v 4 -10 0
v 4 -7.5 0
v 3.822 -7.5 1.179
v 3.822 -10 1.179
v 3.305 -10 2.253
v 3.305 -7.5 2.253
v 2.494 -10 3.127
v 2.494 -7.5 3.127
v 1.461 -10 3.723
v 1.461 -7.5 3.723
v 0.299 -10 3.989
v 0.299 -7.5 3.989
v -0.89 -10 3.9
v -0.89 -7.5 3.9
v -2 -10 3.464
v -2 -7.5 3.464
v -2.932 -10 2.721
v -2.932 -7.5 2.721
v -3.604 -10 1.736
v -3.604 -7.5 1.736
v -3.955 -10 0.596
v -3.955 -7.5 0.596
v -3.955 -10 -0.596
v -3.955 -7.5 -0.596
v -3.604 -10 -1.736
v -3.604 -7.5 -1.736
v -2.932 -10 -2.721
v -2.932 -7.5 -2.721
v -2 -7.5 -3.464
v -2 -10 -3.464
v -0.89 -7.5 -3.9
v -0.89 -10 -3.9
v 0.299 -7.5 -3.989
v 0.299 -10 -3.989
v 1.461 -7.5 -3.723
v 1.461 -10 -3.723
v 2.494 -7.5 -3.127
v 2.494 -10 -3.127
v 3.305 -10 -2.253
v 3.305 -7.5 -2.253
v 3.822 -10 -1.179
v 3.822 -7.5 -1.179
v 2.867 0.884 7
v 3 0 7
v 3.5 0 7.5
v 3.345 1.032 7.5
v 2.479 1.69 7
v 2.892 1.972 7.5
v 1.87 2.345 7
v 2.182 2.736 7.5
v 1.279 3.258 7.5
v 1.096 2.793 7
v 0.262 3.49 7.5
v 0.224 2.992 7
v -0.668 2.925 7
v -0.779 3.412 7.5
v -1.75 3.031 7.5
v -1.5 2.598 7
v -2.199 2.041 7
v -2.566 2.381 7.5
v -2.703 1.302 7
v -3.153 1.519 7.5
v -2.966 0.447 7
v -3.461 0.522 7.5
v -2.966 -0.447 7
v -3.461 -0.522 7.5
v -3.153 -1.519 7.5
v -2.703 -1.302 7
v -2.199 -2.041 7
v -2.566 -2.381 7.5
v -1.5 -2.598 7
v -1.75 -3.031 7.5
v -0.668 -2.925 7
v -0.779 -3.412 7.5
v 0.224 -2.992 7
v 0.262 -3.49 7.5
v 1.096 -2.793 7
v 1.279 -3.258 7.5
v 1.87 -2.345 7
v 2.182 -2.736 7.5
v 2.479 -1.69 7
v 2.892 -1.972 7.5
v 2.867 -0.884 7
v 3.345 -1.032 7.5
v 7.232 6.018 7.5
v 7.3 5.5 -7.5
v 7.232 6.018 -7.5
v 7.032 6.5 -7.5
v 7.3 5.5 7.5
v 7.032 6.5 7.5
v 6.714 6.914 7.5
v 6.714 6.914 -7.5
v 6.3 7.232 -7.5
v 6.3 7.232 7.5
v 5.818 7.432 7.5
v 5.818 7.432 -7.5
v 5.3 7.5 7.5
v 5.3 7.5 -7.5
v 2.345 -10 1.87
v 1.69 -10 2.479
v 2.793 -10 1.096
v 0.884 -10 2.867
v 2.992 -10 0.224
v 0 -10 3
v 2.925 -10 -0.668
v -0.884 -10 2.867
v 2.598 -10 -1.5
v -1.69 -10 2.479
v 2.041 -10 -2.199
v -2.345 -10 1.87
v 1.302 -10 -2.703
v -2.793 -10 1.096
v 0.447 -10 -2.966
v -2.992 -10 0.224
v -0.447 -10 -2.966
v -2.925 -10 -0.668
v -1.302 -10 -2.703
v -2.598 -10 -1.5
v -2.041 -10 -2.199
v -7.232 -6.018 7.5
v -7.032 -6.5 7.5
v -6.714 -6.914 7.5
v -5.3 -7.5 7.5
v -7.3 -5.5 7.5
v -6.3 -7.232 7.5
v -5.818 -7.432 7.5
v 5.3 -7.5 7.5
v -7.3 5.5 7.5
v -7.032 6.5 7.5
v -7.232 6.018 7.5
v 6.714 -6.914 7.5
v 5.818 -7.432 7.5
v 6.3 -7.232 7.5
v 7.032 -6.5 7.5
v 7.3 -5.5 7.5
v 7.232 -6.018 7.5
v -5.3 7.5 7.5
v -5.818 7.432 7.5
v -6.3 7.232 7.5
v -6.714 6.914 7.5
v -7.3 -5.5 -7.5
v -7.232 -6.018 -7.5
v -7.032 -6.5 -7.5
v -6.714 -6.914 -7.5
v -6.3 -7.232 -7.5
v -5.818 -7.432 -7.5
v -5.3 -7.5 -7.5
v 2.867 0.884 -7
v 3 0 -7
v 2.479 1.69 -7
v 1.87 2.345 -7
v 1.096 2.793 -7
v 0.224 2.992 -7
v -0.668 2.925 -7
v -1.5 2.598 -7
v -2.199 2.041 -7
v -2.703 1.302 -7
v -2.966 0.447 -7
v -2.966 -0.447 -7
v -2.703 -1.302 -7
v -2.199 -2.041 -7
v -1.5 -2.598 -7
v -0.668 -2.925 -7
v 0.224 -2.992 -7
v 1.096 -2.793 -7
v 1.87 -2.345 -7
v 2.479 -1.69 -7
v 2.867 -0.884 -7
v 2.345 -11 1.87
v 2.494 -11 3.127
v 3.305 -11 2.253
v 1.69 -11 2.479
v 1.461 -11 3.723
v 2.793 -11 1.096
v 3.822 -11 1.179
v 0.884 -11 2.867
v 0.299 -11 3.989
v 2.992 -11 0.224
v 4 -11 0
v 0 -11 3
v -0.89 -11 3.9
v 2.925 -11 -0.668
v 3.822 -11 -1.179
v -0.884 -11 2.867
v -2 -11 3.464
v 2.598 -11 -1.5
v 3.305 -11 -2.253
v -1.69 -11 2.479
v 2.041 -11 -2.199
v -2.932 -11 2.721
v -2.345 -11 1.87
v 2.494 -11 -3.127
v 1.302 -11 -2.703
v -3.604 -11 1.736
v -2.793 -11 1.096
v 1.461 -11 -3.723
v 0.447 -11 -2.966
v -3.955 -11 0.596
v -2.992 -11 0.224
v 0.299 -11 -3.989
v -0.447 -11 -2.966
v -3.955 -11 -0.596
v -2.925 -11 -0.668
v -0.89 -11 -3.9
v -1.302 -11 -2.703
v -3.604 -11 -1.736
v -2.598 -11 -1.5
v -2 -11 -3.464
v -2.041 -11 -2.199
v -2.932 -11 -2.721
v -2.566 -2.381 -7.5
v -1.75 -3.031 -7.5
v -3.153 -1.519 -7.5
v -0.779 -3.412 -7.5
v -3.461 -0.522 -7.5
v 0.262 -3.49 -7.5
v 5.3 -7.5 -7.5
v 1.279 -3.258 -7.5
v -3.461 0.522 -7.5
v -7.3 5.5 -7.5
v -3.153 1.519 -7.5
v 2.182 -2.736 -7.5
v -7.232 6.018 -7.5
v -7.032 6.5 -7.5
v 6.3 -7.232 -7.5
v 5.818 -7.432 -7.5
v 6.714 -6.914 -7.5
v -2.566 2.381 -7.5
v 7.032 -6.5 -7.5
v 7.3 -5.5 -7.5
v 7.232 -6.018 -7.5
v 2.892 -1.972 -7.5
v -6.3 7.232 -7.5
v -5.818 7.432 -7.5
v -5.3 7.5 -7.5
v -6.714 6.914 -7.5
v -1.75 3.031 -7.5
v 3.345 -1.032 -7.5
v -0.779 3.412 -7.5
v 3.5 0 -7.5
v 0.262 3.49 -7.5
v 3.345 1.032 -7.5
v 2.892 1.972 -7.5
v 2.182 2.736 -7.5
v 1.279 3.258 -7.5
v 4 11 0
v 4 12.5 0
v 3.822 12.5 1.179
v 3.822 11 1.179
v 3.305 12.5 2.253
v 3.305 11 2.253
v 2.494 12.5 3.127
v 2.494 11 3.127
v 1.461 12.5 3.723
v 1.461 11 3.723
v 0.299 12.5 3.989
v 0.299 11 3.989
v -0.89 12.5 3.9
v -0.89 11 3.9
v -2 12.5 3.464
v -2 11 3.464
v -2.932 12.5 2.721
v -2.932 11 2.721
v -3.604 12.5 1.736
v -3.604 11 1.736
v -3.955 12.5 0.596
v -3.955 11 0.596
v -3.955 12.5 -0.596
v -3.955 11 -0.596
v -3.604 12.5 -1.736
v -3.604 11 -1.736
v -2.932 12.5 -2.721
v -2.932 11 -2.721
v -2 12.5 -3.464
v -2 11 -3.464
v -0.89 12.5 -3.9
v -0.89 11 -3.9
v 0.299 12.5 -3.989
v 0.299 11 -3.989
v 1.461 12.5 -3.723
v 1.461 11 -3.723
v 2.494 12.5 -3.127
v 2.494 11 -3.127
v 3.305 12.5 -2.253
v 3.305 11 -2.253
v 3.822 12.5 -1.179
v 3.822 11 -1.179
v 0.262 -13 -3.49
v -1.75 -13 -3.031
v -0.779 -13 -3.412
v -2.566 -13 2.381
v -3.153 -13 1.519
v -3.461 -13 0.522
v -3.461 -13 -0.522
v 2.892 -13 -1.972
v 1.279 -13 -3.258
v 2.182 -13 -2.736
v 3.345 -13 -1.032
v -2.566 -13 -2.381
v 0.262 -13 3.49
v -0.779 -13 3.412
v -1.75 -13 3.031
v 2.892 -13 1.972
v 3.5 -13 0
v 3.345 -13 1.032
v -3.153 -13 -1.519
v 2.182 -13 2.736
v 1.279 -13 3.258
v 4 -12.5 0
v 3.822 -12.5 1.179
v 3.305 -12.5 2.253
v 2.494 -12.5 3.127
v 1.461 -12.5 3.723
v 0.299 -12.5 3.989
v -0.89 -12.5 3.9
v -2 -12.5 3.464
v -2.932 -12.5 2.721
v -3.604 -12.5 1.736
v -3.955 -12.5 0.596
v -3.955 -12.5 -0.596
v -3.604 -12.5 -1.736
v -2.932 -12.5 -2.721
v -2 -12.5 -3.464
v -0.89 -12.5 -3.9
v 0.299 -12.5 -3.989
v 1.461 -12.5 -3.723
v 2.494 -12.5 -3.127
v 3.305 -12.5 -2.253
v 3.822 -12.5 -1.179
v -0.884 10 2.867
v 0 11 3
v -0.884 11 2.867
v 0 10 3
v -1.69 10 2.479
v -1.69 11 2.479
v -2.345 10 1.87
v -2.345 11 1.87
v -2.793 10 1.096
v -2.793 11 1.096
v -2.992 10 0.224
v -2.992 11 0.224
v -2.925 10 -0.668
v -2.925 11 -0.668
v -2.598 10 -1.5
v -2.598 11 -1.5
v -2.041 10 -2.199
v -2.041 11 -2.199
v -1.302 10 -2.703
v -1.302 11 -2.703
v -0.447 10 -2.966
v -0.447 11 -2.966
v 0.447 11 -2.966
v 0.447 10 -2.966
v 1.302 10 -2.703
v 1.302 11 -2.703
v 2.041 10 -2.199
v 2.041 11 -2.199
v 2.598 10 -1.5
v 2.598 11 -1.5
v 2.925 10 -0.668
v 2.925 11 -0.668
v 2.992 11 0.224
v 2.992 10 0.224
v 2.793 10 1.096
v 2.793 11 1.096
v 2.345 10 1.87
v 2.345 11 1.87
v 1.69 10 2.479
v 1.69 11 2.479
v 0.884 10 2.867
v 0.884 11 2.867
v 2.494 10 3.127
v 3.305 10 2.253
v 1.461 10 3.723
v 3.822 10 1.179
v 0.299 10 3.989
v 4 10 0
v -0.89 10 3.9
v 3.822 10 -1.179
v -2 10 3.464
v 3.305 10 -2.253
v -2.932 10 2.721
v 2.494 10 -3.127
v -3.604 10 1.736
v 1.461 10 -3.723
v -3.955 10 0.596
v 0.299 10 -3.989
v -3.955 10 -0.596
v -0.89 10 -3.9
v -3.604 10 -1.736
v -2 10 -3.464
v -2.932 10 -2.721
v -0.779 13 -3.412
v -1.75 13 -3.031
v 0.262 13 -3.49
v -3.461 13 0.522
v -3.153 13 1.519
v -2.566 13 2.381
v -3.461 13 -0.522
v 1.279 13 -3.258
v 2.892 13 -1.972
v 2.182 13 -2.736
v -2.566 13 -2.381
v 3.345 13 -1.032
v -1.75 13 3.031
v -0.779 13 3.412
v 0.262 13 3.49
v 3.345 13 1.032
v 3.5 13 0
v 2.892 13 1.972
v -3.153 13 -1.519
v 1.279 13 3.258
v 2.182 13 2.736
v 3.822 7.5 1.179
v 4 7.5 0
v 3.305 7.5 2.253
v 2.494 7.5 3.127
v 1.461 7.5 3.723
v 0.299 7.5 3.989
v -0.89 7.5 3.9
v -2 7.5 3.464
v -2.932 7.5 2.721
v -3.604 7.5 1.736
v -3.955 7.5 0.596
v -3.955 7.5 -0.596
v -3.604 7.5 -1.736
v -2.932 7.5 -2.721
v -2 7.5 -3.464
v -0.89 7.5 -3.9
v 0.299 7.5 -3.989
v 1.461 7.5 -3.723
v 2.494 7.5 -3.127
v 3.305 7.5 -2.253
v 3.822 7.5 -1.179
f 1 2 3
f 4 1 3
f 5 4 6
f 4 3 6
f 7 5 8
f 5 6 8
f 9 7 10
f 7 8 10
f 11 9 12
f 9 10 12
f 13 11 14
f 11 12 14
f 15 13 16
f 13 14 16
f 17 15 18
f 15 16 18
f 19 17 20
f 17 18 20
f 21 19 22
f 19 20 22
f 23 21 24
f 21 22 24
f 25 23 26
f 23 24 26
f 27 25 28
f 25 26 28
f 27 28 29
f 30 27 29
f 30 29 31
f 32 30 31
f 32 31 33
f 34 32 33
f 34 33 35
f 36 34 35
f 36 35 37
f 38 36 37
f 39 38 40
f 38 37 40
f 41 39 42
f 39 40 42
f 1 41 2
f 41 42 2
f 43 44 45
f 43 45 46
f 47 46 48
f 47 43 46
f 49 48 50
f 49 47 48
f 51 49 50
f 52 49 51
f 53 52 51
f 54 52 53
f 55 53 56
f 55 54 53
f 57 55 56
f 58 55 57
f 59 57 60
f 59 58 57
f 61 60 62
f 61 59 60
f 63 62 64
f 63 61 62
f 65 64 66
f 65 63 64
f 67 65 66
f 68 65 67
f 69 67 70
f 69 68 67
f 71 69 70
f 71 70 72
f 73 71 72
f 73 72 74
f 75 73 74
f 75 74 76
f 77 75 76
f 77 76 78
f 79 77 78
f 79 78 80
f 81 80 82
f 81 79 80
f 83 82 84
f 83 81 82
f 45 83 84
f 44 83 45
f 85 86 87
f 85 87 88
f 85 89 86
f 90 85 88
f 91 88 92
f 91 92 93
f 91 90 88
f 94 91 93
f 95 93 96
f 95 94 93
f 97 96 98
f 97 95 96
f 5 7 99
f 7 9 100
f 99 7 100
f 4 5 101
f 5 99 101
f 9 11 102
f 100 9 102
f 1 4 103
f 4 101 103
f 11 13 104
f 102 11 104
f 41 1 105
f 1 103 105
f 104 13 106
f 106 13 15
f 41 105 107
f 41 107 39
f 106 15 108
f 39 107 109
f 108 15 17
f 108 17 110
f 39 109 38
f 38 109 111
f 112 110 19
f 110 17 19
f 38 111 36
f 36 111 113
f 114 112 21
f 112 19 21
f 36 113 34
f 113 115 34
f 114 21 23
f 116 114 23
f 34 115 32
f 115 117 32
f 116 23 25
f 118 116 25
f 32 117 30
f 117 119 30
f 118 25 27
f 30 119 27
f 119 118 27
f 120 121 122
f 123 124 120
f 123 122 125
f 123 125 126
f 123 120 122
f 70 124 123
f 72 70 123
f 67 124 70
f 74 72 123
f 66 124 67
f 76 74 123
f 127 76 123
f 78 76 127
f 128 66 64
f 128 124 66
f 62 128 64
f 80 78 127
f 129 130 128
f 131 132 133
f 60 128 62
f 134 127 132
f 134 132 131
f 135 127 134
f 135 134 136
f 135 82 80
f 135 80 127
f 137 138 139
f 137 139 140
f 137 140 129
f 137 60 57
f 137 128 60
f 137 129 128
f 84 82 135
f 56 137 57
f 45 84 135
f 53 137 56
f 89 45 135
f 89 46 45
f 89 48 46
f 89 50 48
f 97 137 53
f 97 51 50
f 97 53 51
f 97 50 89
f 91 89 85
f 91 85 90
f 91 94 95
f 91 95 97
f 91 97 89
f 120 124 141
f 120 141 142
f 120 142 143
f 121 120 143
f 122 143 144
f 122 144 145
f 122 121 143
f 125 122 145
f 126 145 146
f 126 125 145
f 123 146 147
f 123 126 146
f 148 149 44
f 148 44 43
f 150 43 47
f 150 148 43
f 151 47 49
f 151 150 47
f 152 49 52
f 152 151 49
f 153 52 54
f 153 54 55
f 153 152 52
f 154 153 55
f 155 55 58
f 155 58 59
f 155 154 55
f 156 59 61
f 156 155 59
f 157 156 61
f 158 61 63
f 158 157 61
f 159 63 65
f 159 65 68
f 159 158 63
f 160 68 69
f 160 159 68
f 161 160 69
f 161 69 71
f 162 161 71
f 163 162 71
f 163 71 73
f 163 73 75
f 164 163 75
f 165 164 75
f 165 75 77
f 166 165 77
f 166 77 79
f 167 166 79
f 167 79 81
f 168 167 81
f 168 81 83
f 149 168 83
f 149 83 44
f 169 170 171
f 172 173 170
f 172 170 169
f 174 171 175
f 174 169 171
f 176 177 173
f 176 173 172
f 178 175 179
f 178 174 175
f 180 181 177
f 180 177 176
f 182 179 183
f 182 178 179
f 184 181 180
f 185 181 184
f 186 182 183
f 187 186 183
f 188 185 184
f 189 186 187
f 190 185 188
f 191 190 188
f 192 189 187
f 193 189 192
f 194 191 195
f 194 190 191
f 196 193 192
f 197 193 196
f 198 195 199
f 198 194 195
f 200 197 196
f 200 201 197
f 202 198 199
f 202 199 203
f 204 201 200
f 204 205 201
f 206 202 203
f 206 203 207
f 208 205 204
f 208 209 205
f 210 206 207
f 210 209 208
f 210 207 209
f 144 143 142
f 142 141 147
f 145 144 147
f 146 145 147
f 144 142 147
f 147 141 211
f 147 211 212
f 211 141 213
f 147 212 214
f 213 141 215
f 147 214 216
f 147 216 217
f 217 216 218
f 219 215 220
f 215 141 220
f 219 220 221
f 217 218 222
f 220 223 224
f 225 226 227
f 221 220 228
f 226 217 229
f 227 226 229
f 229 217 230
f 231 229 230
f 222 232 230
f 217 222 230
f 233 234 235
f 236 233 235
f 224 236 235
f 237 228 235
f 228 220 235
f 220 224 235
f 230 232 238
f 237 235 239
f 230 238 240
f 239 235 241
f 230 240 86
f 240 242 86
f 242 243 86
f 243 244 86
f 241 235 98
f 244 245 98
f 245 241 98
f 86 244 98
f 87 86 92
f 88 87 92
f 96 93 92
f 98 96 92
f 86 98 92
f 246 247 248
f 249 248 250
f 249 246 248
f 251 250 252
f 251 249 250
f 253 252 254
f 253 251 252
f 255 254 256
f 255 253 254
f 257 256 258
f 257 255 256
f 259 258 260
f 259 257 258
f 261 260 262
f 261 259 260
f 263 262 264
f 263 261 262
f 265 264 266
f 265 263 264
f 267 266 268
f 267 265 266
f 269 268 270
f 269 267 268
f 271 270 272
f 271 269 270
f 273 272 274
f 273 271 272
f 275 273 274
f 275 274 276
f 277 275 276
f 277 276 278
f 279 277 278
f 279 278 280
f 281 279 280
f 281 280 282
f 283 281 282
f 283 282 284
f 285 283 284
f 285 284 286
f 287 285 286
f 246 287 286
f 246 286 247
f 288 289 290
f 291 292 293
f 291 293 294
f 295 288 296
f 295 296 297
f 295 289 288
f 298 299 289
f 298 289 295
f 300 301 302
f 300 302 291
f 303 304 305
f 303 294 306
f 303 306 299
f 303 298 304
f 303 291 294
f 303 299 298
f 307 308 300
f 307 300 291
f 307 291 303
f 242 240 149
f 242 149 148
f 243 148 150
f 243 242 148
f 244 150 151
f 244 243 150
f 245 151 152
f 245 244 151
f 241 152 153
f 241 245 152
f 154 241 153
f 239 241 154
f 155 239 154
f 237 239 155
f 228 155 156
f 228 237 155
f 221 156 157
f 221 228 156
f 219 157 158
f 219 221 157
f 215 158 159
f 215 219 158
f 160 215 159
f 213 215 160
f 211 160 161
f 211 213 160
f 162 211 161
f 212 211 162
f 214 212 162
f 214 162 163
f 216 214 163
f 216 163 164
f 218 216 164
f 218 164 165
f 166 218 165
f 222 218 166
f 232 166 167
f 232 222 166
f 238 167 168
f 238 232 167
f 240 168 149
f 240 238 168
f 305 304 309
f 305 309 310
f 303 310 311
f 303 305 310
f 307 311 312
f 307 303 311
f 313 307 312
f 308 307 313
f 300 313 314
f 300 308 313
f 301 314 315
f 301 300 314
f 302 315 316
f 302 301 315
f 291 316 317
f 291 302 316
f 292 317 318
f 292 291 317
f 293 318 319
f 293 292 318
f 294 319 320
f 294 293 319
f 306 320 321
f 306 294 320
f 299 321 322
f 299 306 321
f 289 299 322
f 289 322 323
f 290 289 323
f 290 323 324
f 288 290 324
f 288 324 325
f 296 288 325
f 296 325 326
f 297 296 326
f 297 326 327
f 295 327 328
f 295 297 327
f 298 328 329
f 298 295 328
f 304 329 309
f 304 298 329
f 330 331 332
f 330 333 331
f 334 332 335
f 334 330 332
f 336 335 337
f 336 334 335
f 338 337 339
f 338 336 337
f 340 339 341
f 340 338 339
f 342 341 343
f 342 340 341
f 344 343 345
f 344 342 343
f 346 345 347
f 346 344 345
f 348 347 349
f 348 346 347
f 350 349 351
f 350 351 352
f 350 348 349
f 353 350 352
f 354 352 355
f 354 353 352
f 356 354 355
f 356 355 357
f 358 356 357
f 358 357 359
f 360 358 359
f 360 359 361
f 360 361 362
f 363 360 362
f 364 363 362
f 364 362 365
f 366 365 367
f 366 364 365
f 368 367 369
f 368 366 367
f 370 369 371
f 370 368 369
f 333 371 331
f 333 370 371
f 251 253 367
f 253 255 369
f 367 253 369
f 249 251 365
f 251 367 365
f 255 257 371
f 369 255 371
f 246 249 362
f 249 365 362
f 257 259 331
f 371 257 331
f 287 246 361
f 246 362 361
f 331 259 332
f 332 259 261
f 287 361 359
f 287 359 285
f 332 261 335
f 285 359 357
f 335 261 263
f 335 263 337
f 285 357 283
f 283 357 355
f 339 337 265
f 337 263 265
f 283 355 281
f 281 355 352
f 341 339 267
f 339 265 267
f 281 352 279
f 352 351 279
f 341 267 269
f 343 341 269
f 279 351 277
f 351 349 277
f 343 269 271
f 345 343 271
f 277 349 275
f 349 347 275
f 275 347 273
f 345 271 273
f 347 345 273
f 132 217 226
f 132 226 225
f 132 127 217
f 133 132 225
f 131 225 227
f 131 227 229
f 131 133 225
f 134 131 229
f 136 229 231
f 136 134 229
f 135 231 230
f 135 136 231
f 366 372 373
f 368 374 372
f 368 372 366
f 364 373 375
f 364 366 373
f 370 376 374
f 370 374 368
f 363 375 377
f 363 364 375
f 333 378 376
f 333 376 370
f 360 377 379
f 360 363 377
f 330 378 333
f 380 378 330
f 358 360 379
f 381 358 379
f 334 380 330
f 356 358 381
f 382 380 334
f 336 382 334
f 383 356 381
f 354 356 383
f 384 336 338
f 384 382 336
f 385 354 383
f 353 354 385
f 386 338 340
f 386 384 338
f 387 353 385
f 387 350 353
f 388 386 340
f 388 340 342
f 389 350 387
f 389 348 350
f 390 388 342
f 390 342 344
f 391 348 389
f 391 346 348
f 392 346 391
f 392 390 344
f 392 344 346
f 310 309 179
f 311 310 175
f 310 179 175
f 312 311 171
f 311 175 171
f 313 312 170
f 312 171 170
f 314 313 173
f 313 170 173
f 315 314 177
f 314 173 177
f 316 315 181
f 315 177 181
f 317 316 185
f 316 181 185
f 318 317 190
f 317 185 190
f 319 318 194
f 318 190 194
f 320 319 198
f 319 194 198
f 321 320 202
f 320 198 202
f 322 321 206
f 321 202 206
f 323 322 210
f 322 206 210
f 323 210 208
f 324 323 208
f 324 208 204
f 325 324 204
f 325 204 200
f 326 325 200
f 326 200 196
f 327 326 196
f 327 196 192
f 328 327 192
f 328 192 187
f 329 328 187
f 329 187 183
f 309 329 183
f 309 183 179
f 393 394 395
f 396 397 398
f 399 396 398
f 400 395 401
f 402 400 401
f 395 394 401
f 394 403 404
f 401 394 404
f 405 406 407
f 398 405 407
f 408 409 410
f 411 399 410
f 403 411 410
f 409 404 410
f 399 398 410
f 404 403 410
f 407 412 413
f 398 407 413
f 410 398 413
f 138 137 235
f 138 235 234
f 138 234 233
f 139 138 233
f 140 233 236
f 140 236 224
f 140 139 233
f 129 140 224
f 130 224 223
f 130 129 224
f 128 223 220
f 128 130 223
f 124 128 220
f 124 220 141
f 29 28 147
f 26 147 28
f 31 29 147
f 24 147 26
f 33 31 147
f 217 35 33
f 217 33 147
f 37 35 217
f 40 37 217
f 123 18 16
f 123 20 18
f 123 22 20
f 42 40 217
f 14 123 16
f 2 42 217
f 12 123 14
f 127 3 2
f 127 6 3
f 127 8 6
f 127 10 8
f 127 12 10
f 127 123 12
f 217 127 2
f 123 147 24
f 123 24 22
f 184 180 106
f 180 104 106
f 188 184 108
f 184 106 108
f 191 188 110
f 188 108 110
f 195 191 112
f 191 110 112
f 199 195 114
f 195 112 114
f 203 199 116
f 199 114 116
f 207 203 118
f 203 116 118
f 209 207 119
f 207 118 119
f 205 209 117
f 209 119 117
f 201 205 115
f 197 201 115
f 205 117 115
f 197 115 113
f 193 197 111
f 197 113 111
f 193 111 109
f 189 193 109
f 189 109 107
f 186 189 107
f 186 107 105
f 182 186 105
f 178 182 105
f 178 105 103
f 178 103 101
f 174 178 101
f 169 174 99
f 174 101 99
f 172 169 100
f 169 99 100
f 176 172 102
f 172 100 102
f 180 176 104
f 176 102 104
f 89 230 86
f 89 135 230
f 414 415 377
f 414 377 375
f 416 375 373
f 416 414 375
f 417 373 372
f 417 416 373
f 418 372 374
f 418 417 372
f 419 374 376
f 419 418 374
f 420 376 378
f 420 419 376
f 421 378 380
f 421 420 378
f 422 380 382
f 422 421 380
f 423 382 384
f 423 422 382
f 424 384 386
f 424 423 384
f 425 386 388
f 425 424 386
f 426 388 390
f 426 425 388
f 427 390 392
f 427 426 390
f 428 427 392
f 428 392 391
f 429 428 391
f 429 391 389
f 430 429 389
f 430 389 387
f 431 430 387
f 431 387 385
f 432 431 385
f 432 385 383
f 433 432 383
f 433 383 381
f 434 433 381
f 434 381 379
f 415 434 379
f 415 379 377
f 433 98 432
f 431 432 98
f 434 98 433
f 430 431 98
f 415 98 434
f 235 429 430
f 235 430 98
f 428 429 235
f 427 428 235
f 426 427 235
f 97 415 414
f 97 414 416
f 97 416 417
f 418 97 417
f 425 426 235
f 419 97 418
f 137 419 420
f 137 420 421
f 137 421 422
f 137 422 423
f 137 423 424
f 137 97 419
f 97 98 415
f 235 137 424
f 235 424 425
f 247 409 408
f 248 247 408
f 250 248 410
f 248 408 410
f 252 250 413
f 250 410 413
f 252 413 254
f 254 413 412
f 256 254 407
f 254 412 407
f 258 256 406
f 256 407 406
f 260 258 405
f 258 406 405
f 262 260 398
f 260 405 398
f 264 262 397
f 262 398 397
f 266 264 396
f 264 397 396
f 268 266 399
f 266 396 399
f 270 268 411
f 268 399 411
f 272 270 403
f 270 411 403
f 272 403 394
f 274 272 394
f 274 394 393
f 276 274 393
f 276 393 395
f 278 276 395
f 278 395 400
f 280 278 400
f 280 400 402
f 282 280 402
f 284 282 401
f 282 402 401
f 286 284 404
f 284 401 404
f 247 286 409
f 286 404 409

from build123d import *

# Parameters (mm, degrees)
F0_R     = 3
F1_DEPTH = 7.5
F2_SIZE2 = 0.5
F2_SIZE  = 0.5
F3_R     = 4
F4_DEPTH = 5.5
F5_SIZE2 = 0.5
F5_SIZE  = 0.5
F6_W     = 1
F6_H     = 1


# Not quite as in the source:
# - a feature of the source that left no trace in its solid (it failed there, or was rolled back) is left out
# - a pattern or mirror of a feature is missing from the dataset's text; its kind, count and spacing are read off the source's solid


with BuildPart() as f1:
    # F0 (on Top) → F1 (new body, symmetric)
    with BuildSketch(Plane.XY):
        with BuildLine():
            ThreePointArc((7.3, 5.5), (6.7142135624, 6.9142135624), (5.3, 7.5))
            Line((5.3, 7.5), (-5.3, 7.5))
            ThreePointArc((-5.3, 7.5), (-6.7142135624, 6.9142135624), (-7.3, 5.5))
            Line((-7.3, 5.5), (-7.3, -5.5))
            ThreePointArc((-7.3, -5.5), (-6.7142135624, -6.9142135624), (-5.3, -7.5))
            Line((-5.3, -7.5), (5.3, -7.5))
            ThreePointArc((5.3, -7.5), (6.7142135624, -6.9142135624), (7.3, -5.5))
            Line((7.3, -5.5), (7.3, 5.5))
        make_face()
        Circle(F0_R, mode=Mode.SUBTRACT)
    extrude(amount=F1_DEPTH, both=True)

    # F2
    f2_edges = [f1.edges().sort_by_distance(p)[0] for p in [
        (-3, 0, 7.5),
        (-3, 0, -7.5),
    ]]
    chamfer(f2_edges, length=F2_SIZE, length2=F2_SIZE2)

    # F3 (on face) → F4 (join)
    with BuildSketch(Plane.XZ.offset(7.5)):
        Circle(F3_R)
    f4 = extrude(amount=F4_DEPTH)

    # F4_copies: F4 across plane
    add(f4.mirror(Plane.ZX))

    # F5
    f5_edges = [f1.edges().sort_by_distance(p)[0] for p in [
        (-4, -13, 0),
        (-4, 13, 0),
    ]]
    chamfer(f5_edges, length=F5_SIZE, length2=F5_SIZE2)

    # F6 (on Right) → F7 (revolve, cut)
    with BuildSketch(Plane.YZ):
        with Locations((-10.5, 3.5)):
            Rectangle(F6_W, F6_H)
    f7 = revolve(axis=Axis((0, -13, 0), (0, -1, 0)), mode=Mode.SUBTRACT)

    # F7_copies: F7 across plane
    add(f7.mirror(Plane.ZX), mode=Mode.SUBTRACT)


solid = f1.part
